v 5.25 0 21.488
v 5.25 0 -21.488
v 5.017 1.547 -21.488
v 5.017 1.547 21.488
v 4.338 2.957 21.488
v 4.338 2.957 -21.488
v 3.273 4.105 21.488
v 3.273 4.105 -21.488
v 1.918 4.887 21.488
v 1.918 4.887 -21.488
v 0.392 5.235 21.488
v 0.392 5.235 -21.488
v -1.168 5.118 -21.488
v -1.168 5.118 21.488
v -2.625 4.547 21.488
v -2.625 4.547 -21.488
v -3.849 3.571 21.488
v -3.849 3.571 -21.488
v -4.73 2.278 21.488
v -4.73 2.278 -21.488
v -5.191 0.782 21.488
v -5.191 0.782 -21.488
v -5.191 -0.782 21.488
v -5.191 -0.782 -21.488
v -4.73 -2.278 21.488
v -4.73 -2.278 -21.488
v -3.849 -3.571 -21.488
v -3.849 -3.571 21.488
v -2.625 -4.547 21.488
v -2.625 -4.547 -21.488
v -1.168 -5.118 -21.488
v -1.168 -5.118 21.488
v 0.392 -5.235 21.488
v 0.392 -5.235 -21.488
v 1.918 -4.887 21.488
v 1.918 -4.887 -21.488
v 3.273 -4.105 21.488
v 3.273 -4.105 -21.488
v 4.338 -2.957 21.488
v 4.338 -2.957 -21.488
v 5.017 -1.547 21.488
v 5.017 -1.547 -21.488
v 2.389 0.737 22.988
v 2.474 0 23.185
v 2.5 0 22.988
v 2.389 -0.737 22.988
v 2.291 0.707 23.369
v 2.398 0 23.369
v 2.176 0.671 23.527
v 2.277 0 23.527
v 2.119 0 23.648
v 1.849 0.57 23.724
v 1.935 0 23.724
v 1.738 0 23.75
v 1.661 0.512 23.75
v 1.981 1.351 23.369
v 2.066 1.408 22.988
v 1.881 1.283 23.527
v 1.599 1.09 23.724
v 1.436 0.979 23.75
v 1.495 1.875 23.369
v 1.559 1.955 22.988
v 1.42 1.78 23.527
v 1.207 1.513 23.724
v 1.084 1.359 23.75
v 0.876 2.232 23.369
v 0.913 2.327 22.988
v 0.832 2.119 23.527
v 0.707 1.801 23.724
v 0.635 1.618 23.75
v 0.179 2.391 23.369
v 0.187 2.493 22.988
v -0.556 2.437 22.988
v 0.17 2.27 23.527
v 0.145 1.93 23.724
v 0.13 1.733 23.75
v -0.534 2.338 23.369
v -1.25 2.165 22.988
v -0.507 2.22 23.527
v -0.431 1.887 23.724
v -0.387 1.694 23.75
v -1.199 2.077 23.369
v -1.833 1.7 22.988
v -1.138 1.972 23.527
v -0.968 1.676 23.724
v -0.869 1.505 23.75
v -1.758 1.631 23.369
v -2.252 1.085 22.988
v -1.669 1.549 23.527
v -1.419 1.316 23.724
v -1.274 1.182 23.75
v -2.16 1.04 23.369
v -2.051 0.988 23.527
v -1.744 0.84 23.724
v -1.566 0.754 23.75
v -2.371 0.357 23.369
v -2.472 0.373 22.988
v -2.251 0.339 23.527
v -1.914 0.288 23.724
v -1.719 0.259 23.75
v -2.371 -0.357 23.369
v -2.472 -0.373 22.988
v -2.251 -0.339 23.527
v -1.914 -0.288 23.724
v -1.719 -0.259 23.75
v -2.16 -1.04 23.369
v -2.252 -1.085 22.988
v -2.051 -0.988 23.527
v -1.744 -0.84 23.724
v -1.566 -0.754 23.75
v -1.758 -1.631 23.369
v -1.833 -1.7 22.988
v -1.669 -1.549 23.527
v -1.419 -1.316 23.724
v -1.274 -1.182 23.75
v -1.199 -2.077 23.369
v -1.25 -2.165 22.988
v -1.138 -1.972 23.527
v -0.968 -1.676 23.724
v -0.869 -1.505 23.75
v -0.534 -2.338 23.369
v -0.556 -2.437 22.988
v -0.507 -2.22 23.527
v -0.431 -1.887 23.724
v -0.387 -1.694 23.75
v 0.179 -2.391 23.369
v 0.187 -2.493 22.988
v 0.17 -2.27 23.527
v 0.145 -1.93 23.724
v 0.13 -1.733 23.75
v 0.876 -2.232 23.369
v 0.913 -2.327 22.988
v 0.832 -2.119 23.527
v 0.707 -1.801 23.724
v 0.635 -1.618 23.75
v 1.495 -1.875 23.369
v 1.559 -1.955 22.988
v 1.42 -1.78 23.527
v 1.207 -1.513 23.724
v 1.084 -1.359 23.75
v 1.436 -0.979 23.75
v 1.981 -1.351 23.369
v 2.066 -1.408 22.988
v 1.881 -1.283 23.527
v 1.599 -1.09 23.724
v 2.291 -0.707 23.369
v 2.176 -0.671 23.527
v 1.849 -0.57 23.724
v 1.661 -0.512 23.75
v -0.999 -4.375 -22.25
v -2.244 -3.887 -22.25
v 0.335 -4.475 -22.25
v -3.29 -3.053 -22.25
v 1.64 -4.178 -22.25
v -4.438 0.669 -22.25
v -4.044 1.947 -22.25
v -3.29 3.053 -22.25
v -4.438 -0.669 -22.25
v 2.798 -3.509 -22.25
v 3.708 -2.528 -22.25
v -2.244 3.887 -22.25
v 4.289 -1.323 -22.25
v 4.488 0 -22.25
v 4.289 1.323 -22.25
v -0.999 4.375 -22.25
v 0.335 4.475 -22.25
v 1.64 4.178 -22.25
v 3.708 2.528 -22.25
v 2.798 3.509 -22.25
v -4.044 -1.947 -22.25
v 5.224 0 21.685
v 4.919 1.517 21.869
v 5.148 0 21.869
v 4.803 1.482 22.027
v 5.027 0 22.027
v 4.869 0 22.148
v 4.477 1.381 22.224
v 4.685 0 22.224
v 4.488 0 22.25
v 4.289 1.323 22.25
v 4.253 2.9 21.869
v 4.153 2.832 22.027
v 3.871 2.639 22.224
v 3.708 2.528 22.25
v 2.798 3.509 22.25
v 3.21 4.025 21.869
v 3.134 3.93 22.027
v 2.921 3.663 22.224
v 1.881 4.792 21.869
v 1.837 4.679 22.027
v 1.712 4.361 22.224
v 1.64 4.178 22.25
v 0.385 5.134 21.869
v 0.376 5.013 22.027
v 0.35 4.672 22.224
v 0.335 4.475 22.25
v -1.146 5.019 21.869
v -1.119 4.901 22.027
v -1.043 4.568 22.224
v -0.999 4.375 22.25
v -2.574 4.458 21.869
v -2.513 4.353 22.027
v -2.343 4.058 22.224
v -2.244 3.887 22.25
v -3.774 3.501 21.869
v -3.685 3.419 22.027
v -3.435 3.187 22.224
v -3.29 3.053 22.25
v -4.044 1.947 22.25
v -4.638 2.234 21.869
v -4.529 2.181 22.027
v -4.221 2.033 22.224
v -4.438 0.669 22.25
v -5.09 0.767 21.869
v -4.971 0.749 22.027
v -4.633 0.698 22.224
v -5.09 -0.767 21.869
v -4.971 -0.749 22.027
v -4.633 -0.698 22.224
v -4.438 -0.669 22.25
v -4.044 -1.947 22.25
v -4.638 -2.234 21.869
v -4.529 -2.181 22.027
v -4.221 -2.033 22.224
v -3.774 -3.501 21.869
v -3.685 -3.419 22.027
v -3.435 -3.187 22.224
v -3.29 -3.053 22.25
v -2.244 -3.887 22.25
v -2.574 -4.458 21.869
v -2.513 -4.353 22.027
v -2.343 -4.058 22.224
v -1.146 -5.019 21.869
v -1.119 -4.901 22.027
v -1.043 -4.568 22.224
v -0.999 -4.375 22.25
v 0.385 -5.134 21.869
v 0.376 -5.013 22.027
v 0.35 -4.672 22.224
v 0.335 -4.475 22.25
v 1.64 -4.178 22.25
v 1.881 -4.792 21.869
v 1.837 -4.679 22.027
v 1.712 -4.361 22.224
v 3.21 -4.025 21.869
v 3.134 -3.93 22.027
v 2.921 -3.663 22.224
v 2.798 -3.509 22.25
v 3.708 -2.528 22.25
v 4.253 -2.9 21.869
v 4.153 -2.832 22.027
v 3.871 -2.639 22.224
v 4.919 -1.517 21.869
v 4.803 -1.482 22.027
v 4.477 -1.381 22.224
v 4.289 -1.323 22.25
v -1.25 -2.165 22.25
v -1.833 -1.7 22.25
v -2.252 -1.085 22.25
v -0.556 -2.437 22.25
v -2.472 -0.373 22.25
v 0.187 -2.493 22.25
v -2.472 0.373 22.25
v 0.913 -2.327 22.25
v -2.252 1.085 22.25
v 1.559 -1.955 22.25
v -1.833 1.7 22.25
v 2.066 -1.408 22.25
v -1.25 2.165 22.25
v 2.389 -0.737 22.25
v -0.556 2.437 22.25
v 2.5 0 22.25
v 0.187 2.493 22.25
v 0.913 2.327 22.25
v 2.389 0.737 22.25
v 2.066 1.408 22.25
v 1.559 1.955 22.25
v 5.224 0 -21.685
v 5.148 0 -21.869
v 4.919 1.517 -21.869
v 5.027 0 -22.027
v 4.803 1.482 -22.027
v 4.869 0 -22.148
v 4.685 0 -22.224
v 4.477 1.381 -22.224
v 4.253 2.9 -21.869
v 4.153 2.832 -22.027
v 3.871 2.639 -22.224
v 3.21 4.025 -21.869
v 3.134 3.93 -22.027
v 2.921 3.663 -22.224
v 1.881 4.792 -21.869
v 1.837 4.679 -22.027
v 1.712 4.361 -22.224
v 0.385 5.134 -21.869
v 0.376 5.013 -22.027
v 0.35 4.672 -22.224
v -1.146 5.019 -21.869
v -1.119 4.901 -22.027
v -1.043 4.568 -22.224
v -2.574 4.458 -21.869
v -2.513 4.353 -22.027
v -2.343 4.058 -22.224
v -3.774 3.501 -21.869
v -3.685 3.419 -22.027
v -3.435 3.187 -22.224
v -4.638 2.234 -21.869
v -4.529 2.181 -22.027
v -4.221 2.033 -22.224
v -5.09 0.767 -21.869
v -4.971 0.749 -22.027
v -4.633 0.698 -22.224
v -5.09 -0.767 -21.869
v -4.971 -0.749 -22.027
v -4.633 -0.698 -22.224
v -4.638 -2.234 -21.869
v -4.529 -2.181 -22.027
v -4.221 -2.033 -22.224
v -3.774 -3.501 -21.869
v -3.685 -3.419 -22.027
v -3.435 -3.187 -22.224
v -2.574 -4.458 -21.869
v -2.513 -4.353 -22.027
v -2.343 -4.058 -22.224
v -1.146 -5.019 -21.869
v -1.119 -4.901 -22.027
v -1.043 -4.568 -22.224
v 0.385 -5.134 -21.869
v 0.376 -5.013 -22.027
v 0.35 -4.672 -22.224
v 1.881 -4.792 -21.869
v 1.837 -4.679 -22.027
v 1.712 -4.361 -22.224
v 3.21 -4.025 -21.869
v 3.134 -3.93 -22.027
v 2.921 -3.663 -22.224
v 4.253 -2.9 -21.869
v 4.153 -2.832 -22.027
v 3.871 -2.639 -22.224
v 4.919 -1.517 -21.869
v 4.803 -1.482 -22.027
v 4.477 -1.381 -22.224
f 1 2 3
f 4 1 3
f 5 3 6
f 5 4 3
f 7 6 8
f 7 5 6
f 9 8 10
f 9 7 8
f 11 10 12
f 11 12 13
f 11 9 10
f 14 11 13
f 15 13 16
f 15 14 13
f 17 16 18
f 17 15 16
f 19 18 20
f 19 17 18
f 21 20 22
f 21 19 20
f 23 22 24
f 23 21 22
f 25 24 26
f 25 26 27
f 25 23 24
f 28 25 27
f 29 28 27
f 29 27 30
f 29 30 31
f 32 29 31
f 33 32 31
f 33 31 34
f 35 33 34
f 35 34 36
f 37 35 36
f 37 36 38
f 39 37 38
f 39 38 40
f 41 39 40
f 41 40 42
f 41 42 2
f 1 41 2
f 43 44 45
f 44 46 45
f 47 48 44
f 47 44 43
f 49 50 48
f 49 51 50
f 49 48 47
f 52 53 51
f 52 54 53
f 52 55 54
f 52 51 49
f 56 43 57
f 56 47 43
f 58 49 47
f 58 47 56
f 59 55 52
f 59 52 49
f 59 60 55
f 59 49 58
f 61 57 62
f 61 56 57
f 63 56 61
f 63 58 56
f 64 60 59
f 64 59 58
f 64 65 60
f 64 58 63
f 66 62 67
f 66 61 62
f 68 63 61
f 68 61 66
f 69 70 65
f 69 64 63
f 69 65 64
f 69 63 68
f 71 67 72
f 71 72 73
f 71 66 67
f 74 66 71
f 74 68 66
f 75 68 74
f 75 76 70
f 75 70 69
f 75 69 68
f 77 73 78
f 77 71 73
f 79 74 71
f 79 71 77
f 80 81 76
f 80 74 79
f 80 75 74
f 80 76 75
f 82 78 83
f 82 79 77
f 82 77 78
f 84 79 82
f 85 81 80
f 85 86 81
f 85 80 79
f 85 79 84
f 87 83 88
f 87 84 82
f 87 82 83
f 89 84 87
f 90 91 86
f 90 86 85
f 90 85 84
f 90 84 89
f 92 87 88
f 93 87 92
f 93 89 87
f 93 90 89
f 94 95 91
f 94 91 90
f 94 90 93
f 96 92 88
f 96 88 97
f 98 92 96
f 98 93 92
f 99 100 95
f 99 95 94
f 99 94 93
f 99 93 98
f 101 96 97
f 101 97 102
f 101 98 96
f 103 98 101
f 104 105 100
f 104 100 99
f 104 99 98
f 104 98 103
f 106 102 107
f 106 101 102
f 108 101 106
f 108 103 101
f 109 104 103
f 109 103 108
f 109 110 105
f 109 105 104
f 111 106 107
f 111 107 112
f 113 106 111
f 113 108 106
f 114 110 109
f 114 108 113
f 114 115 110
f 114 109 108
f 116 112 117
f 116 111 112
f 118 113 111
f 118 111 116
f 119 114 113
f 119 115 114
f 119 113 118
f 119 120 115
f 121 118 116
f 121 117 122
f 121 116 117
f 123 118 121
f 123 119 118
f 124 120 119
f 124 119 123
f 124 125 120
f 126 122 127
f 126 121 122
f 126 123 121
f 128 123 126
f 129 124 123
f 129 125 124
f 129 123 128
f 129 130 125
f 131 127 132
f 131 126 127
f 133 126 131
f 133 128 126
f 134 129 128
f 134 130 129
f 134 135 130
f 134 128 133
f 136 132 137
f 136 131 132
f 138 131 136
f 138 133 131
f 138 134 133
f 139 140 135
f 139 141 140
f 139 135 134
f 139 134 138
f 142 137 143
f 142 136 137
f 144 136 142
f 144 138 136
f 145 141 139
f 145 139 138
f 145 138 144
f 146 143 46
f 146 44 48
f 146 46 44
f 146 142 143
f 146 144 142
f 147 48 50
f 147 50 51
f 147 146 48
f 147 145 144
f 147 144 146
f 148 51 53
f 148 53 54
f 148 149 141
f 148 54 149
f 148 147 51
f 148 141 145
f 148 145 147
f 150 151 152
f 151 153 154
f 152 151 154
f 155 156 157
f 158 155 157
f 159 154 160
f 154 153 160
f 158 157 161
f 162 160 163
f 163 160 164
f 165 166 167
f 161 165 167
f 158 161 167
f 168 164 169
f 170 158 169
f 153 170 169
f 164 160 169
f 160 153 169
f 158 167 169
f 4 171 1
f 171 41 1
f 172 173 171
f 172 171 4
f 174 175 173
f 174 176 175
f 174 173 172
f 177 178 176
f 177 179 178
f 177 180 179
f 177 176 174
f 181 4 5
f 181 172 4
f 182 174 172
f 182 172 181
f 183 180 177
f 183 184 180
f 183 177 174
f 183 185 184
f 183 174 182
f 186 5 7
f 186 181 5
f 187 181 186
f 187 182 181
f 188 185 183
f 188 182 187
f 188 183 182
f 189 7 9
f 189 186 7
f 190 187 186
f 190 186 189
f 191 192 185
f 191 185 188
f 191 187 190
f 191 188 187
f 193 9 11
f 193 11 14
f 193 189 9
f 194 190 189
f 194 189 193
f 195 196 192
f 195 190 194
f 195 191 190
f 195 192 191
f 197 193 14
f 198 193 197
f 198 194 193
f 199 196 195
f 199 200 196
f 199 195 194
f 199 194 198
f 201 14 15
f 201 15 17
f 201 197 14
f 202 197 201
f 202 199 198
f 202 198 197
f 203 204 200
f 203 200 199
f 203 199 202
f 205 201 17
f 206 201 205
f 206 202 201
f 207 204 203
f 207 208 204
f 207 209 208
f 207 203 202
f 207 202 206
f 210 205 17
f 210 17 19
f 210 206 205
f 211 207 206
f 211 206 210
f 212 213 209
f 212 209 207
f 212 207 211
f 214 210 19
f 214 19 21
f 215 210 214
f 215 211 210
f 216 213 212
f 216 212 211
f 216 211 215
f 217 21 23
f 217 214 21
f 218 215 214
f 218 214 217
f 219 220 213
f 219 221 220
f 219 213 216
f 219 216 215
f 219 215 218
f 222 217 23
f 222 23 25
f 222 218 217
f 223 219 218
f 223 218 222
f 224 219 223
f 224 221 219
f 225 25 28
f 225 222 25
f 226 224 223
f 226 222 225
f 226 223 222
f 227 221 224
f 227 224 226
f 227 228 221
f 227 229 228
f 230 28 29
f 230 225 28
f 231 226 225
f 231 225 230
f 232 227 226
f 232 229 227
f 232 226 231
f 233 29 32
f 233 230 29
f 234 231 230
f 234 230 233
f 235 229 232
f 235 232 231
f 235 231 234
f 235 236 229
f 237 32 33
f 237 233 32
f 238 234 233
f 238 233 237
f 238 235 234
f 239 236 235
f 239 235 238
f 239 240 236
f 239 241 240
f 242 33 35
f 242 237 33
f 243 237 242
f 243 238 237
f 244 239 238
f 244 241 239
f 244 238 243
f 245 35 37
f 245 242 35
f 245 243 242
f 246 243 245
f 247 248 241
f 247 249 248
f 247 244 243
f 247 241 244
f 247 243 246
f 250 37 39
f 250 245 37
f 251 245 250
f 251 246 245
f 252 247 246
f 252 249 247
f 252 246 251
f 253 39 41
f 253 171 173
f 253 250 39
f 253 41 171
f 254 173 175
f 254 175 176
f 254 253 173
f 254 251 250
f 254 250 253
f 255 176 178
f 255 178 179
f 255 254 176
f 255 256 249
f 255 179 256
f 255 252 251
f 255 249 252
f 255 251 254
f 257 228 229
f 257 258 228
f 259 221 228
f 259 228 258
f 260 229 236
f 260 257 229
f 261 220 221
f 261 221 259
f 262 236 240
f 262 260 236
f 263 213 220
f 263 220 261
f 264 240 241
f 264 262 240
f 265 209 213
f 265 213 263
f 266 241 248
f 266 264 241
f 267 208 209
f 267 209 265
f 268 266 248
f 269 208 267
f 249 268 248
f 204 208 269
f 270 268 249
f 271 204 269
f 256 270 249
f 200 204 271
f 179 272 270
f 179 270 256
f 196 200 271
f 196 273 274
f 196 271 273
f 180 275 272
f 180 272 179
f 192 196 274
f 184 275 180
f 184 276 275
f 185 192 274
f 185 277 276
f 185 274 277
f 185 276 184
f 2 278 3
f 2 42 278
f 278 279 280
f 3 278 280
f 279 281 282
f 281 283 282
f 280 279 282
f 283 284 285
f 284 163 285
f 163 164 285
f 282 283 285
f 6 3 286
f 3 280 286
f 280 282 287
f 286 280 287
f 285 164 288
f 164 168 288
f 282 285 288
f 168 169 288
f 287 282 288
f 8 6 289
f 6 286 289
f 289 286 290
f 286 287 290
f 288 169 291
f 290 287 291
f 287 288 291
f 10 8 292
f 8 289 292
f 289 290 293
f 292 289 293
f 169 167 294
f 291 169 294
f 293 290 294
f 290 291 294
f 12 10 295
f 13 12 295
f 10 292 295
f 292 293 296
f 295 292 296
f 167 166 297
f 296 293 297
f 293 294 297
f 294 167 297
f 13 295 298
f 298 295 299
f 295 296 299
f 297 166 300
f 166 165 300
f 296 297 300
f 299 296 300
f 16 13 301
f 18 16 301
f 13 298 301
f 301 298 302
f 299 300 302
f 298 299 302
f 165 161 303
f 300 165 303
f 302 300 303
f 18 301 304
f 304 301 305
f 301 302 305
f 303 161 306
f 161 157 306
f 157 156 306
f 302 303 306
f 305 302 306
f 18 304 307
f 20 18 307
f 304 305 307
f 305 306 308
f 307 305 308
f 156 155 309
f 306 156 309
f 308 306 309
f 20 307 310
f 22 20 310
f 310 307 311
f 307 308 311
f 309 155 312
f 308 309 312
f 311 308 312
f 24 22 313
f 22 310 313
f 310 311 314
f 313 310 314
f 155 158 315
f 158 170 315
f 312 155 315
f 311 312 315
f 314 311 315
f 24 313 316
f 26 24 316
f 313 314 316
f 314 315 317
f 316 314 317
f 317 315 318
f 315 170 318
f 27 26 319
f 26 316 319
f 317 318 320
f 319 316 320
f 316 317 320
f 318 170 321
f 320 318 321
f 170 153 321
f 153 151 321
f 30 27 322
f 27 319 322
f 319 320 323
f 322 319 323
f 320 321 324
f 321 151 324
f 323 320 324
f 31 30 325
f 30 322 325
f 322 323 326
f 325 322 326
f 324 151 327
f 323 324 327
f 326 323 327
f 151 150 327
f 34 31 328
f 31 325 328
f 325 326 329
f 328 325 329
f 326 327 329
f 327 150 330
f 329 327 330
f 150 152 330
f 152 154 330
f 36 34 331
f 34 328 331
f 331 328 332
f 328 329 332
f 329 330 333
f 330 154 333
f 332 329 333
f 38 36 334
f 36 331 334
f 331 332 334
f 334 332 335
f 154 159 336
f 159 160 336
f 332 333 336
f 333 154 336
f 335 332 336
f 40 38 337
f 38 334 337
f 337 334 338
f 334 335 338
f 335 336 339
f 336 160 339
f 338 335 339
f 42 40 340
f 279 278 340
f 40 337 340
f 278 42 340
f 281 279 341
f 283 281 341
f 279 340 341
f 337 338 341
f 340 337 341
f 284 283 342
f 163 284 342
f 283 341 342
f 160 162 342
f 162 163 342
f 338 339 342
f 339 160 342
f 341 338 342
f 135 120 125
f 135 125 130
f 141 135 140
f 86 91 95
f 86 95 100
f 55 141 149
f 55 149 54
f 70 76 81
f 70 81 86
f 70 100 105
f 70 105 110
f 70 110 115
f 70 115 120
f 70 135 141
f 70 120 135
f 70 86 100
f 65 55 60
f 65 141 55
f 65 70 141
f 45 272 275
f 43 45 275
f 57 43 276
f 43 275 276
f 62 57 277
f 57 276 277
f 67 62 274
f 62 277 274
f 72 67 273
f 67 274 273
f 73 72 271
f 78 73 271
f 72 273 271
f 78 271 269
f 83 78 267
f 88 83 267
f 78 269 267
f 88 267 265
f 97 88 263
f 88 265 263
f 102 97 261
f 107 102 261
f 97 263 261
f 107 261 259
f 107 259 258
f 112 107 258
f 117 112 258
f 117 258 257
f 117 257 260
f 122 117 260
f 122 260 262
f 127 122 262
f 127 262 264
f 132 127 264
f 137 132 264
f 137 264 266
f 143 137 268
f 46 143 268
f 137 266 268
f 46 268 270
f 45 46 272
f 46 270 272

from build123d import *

# Parameters (mm, degrees)
F0_R     = 5.25
F1_DEPTH = 22.25
F2_R     = 2.5
F3_DEPTH = 1.5
F4_R     = 0.762


with BuildPart() as f1:
    # F0 (on Top) → F1 (new body, symmetric)
    with BuildSketch(Plane.XY):
        Circle(F0_R)
    extrude(amount=F1_DEPTH, both=True)

    # F2 (on face) → F3 (join)
    with BuildSketch(Plane.XY.offset(22.25)):
        Circle(F2_R)
    extrude(amount=F3_DEPTH)

    # F4
    f4_edges = [f1.edges().sort_by_distance(p)[0] for p in [
        (-2.5, 0, 23.75),
        (-5.25, 0, -22.25),
        (-5.25, 0, 22.25),
    ]]
    fillet(f4_edges, radius=F4_R)


solid = f1.part
